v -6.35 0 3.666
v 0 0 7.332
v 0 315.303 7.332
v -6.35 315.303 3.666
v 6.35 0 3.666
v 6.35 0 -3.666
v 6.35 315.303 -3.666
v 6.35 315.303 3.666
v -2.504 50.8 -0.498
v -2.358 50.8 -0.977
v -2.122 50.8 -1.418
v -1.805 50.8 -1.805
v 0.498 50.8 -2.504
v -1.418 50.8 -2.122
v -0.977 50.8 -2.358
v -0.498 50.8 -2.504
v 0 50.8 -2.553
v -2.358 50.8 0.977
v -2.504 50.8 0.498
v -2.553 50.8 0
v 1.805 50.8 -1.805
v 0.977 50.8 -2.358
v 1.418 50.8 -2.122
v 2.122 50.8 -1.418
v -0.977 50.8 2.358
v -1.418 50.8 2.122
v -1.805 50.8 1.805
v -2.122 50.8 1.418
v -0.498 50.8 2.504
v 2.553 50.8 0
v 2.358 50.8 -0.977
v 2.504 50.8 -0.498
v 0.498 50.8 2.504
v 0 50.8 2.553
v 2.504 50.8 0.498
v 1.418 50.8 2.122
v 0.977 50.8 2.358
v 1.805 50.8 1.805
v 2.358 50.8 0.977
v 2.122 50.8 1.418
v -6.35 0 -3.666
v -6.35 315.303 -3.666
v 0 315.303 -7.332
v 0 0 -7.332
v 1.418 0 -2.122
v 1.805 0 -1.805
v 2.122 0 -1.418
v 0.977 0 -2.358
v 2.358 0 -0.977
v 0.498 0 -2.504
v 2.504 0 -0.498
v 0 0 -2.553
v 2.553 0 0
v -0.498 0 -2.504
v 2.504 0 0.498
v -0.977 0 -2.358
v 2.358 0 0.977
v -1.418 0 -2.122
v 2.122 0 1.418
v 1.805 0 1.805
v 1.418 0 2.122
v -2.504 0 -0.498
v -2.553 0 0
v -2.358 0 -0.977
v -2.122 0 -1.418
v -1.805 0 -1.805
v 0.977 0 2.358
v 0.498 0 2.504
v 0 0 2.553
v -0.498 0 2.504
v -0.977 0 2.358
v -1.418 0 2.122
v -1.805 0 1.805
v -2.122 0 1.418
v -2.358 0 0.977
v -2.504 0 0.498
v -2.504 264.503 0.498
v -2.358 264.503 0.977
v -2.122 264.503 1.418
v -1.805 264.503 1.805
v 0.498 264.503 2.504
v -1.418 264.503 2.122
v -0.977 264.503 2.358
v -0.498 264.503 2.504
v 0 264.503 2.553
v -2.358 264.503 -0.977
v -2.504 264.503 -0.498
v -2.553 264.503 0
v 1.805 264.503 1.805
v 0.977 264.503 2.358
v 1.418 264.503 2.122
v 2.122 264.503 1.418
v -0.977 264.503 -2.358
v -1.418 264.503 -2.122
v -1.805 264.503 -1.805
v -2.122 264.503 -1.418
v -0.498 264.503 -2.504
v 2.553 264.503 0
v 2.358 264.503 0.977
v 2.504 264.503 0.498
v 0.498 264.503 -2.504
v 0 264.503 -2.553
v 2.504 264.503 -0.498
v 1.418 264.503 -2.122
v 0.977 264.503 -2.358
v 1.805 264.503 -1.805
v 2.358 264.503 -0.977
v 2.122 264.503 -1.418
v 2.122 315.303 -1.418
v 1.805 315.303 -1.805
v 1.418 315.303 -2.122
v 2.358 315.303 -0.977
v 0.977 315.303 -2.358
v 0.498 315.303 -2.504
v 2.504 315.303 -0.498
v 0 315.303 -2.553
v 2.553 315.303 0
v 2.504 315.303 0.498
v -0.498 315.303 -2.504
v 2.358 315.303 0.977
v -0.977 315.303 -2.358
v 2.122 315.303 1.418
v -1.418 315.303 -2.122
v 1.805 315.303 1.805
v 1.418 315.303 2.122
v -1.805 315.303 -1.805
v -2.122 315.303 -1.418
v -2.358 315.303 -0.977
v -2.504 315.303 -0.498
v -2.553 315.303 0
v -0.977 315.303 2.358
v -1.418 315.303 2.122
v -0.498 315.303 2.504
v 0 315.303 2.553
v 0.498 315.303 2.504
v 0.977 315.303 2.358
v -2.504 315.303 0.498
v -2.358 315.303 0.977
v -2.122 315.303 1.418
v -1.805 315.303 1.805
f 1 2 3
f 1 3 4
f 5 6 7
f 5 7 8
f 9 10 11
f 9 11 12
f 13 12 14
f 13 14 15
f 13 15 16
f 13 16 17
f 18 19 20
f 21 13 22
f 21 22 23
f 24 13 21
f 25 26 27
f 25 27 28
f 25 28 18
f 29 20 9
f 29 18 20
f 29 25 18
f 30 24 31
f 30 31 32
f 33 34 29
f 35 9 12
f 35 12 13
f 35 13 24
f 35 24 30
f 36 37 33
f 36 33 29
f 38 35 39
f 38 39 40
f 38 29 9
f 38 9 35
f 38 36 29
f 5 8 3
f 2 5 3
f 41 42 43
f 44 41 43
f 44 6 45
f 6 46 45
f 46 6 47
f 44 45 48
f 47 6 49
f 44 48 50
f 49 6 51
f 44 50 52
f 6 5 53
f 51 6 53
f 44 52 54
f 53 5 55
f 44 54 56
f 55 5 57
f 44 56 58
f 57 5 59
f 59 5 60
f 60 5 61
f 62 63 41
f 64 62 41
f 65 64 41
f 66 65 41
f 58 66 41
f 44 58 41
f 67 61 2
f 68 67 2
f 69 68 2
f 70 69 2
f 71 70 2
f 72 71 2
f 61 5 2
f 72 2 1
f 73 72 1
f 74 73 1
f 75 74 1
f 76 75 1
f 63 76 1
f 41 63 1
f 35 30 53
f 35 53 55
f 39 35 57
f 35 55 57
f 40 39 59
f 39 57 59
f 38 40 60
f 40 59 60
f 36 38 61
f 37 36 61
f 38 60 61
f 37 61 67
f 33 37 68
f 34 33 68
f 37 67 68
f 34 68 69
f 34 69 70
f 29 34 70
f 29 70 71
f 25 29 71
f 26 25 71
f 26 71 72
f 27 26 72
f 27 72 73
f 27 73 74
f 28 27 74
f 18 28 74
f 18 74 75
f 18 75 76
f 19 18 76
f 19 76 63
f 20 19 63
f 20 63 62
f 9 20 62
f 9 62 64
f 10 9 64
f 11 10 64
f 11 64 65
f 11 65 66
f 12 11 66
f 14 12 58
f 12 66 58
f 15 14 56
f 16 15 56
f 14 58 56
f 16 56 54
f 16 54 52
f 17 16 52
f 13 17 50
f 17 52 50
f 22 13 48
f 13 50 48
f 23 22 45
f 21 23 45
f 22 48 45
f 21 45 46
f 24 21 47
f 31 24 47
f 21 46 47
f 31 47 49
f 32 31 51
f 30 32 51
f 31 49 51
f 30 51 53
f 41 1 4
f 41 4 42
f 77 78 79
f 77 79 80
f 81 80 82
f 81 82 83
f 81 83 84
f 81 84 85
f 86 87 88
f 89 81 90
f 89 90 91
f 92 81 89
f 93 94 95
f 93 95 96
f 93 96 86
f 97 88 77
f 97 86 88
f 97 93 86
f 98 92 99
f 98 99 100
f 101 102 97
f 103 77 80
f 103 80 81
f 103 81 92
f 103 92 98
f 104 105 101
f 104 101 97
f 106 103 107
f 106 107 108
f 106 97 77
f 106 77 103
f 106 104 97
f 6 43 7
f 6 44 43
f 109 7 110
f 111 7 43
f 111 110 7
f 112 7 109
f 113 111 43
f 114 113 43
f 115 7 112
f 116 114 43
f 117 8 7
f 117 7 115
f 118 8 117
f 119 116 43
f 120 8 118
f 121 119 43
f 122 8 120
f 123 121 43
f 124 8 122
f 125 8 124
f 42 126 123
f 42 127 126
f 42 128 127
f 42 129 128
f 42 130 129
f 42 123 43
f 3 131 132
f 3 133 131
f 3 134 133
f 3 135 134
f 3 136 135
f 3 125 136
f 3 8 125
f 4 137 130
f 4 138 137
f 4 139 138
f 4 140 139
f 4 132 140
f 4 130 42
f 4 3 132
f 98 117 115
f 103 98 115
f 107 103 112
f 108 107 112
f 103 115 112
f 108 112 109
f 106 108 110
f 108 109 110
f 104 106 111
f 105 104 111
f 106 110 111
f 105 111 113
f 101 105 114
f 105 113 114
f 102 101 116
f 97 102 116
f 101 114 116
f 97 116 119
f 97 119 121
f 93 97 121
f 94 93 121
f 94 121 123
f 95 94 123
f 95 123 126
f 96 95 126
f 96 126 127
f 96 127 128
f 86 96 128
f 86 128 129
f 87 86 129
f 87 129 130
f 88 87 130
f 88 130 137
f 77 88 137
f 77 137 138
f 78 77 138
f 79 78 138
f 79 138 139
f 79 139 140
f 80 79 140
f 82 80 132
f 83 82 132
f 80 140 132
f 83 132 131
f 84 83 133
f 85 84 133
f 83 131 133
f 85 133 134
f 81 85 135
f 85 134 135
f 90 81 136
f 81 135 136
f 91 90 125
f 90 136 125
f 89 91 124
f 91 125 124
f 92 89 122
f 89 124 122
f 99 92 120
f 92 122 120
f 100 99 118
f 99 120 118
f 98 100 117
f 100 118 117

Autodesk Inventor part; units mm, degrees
ref_plane "YZ Plane" through (0, 0, 0) normal (1, 0, 0) x (0, 1, 0)
ref_plane "XZ Plane" through (0, 0, 0) normal (0, 1, 0) x (-1, 0, 0)
ref_plane "XY Plane" through (0, 0, 0) normal (0, 0, 1) x (1, 0, 0)
sketch "Sketch1" plane through (0, 0, 0) normal (0, 1, 0) x (-1, 0, 0)
  line L0 (6.35, 3.6662) -> (6.35, -3.6662)
  line L1 (6.35, -3.6662) -> (0, -7.3323)
  line L2 (0, -7.3323) -> (-6.35, -3.6662)
  line L3 (-6.35, -3.6662) -> (-6.35, 3.6662)
  line L4 (-6.35, 3.6662) -> (0, 7.3323)
  line L5 (0, 7.3323) -> (6.35, 3.6662)
  point P0 (0, 0)
  point P1 (0, 0)
  dimension "d0" = 12.7
extrude "Extrusion1" add sketch "Sketch1" along normal blind 315.3029
sketch "Sketch2" plane through (0, 315.3029, 0) normal (0, 1, 0) x (1, 0, 0)
  circle A0 centre (0, 0) radius 2.5527
  dimension "d3" = 5.1054
extrude "Extrusion2" cut sketch "Sketch2" against normal blind 50.8
sketch "Sketch3" plane through (0, 0, 0) normal (0, -1, 0) x (1, 0, 0)
  circle A0 centre (0, 0) radius 2.5527
  dimension "d6" = 5.1054
extrude "Extrusion3" cut sketch "Sketch3" against normal blind 50.8
thread "Thread1" size "1/4-20 UNC" class "2B" standard "ANSI Unified Screw Threads" full length
properties part number "CORL_010_DropGearShaft" material "Aluminum 6061"
